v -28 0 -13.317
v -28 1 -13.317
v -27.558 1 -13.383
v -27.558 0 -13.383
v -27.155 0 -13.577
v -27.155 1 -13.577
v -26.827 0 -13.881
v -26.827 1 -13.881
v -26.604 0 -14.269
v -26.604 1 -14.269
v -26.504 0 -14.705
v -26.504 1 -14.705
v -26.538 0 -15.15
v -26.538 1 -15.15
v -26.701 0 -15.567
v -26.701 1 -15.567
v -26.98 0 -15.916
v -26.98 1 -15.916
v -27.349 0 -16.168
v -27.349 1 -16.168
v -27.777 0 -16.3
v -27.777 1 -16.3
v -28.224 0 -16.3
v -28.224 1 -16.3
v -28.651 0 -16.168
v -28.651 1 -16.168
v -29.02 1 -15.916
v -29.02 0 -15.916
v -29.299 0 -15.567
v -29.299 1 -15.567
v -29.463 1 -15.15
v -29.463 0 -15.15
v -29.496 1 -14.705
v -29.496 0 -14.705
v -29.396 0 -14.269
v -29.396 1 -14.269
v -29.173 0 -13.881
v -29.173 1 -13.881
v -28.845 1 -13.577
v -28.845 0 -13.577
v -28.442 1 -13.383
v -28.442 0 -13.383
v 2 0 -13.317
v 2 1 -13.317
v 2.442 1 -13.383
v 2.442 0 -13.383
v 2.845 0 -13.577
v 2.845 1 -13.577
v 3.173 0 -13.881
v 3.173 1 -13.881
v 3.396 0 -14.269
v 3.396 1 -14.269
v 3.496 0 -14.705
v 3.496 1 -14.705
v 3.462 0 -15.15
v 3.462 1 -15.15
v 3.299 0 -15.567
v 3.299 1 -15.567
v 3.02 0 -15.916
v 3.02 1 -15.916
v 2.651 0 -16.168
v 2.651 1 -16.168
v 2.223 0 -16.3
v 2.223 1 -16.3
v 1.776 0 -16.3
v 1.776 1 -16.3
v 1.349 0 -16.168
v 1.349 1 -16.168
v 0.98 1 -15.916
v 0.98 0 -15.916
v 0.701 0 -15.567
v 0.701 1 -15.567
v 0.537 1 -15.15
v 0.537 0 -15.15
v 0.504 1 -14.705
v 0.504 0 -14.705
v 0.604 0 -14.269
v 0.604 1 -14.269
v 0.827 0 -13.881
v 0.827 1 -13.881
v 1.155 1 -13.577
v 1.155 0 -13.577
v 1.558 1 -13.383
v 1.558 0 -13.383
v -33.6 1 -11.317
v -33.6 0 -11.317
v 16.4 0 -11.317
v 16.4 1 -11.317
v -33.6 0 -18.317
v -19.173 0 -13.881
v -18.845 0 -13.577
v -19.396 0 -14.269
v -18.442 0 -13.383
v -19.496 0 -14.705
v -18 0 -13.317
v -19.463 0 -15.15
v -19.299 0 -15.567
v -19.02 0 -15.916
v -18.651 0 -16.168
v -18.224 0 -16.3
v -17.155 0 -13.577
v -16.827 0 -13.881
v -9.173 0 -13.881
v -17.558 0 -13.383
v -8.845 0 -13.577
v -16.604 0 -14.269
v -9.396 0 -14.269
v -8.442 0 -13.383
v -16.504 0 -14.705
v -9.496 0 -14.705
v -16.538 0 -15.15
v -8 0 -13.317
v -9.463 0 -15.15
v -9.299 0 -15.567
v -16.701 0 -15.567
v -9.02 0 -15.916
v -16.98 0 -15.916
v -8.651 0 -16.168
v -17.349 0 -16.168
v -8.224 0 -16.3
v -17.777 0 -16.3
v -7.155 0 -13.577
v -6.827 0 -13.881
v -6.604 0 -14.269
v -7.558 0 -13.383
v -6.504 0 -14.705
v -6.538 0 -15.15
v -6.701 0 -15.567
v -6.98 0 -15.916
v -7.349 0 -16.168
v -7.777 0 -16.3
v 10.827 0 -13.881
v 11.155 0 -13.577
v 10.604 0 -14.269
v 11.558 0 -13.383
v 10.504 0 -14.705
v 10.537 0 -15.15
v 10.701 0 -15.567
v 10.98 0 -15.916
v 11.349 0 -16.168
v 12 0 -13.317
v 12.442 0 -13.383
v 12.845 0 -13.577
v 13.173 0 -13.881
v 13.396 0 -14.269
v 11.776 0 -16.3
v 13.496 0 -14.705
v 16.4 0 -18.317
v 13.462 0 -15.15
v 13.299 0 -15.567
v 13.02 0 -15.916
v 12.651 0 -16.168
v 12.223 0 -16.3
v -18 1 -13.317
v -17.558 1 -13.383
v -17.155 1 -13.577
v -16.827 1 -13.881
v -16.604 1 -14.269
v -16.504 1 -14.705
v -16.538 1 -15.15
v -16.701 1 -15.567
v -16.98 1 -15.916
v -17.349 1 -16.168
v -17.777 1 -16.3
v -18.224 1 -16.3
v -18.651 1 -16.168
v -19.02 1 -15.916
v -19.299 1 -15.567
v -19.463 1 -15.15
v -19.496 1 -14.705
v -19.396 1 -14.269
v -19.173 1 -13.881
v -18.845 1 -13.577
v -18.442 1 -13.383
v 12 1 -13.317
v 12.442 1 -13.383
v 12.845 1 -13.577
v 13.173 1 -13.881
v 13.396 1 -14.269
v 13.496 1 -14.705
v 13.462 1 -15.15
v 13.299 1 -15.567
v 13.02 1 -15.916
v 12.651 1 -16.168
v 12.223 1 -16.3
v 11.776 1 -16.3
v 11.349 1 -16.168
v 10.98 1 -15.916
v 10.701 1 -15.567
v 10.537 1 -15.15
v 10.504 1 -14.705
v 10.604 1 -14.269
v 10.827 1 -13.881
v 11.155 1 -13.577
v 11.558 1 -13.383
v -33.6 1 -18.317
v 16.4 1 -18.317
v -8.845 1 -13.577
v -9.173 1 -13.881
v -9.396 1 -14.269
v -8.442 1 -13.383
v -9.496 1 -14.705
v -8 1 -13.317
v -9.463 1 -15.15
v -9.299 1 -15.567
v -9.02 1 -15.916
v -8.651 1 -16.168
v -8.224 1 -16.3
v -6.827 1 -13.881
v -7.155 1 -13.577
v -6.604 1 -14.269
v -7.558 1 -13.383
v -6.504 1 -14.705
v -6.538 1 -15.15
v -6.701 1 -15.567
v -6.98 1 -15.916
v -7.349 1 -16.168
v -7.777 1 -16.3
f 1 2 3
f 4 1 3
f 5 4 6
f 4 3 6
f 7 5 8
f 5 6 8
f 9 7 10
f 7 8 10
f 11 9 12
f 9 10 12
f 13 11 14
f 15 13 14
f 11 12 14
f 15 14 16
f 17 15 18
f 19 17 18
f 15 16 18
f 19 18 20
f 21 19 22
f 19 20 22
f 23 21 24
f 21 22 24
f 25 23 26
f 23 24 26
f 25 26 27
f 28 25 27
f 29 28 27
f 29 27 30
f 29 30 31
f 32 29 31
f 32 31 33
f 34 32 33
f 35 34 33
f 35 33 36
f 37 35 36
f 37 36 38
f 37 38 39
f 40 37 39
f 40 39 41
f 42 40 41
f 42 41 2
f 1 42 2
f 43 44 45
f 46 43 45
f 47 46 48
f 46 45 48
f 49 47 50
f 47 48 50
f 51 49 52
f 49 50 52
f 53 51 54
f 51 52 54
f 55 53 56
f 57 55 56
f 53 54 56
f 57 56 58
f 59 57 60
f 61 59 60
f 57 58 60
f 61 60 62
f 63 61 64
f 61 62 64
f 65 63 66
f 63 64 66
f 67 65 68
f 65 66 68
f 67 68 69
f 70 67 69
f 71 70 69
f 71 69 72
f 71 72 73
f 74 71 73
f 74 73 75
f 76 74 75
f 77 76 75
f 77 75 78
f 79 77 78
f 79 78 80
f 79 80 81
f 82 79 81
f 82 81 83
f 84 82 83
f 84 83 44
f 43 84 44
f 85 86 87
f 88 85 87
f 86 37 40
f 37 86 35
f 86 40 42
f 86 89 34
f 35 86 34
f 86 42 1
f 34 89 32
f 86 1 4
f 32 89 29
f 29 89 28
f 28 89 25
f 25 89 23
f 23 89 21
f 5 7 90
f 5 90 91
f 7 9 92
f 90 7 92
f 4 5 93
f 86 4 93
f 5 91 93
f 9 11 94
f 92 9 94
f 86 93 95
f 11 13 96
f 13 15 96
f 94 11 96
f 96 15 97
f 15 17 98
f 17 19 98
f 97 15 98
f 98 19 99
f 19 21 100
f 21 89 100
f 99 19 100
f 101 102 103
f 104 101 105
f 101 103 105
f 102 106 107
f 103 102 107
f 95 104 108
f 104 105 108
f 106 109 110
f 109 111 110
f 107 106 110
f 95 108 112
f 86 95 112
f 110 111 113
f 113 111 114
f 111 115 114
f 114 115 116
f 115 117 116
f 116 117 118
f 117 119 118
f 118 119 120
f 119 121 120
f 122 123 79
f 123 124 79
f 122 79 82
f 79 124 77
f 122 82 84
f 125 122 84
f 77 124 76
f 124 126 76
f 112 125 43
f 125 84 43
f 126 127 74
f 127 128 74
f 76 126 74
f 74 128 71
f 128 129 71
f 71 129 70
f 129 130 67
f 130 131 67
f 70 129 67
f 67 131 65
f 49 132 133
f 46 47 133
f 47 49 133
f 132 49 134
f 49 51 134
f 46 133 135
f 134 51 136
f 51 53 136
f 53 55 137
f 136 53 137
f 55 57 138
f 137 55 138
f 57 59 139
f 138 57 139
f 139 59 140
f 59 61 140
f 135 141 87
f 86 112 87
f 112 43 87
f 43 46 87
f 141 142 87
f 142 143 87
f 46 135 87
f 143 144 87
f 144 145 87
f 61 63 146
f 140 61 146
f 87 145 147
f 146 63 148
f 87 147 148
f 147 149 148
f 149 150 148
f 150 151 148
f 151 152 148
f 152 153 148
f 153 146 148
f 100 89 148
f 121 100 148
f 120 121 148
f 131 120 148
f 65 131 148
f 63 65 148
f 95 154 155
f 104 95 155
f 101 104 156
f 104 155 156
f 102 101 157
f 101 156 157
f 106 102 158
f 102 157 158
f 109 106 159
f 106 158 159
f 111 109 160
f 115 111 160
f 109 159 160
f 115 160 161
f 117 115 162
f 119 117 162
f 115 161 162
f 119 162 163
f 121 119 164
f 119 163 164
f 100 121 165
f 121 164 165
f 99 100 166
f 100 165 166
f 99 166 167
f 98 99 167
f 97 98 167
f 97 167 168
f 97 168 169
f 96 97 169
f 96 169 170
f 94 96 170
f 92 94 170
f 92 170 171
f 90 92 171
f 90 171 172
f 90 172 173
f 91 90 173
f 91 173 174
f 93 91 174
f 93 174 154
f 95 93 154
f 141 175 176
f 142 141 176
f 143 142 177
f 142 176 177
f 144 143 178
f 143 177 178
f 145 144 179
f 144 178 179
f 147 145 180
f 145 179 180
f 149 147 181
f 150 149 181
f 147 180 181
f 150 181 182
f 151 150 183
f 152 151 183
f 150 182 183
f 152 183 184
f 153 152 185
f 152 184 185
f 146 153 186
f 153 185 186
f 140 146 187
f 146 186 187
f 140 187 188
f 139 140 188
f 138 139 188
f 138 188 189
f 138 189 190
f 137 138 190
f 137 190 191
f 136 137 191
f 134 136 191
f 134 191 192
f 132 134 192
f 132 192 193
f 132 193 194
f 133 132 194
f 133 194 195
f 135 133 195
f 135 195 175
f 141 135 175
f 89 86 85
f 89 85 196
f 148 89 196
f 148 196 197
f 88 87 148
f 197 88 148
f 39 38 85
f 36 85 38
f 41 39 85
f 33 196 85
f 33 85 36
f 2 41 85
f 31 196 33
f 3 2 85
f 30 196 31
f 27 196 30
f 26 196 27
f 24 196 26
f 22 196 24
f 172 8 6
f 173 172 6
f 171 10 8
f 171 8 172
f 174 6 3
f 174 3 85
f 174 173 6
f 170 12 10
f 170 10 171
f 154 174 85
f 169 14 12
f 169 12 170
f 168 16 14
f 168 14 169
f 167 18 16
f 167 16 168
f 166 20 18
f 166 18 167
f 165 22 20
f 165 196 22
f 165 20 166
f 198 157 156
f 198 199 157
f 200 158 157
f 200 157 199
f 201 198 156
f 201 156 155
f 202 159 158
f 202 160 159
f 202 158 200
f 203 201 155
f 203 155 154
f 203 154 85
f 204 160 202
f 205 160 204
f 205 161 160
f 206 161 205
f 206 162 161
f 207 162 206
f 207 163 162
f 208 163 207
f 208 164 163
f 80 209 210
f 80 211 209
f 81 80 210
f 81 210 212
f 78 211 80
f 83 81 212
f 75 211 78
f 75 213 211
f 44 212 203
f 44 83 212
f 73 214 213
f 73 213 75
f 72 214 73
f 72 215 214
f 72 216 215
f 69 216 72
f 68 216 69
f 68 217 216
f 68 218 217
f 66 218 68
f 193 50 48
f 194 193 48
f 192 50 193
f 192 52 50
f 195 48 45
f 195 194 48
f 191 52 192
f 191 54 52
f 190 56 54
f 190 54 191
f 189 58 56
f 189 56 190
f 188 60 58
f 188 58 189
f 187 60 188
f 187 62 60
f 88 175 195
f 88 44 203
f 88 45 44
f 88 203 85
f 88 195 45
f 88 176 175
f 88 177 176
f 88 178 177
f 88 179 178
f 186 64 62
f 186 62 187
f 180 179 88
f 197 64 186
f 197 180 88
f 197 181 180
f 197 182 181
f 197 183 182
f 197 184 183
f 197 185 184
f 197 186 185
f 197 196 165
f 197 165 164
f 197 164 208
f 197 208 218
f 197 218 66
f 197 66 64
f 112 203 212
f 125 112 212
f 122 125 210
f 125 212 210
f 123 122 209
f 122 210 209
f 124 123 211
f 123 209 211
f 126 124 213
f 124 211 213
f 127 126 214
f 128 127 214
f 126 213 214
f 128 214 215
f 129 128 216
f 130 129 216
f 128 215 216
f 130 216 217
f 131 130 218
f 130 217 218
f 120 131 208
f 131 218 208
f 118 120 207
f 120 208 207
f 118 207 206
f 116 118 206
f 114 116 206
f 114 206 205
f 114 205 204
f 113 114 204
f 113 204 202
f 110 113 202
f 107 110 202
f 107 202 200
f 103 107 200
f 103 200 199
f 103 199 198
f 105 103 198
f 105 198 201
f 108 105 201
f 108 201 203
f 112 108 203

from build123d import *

# Parameters (mm, degrees)
SKETCH1_W           = 50
SKETCH1_H           = 7
BOSS_EXTRUDE1_DEPTH = 1
SKETCH2_R           = 1.5
CUT_EXTRUDE1_DEPTH  = 39.281330669
LPATTERN2_COUNT     = 5
LPATTERN2_PITCH     = 10


with BuildPart() as part:
    # Sketch1 → Boss-Extrude1 (new body)
    with BuildSketch(Plane(origin=(0, 0, 0), x_dir=(1, 0, 0), z_dir=(0, 1, 0))):
        with Locations((-8.6, 14.816666667)):
            Rectangle(SKETCH1_W, SKETCH1_H)
    extrude(amount=BOSS_EXTRUDE1_DEPTH)

    # Sketch2 → Cut-Extrude1 (cut, through all)
    with BuildSketch(Plane(origin=(0, 1, 0), x_dir=(1, 0, 0), z_dir=(0, 1, 0))):
        with Locations(Location((-28.000173189, 14.816666667, 0), (0, 0, 270))):
            Circle(SKETCH2_R)
    cut_extrude1 = extrude(amount=-CUT_EXTRUDE1_DEPTH, mode=Mode.SUBTRACT)

    # LPattern2: Cut-Extrude1 ×5
    with Locations(*[(i * LPATTERN2_PITCH, 0, 0) for i in range(1, LPATTERN2_COUNT)]):
        add(cut_extrude1, mode=Mode.SUBTRACT)


solid = part.part
